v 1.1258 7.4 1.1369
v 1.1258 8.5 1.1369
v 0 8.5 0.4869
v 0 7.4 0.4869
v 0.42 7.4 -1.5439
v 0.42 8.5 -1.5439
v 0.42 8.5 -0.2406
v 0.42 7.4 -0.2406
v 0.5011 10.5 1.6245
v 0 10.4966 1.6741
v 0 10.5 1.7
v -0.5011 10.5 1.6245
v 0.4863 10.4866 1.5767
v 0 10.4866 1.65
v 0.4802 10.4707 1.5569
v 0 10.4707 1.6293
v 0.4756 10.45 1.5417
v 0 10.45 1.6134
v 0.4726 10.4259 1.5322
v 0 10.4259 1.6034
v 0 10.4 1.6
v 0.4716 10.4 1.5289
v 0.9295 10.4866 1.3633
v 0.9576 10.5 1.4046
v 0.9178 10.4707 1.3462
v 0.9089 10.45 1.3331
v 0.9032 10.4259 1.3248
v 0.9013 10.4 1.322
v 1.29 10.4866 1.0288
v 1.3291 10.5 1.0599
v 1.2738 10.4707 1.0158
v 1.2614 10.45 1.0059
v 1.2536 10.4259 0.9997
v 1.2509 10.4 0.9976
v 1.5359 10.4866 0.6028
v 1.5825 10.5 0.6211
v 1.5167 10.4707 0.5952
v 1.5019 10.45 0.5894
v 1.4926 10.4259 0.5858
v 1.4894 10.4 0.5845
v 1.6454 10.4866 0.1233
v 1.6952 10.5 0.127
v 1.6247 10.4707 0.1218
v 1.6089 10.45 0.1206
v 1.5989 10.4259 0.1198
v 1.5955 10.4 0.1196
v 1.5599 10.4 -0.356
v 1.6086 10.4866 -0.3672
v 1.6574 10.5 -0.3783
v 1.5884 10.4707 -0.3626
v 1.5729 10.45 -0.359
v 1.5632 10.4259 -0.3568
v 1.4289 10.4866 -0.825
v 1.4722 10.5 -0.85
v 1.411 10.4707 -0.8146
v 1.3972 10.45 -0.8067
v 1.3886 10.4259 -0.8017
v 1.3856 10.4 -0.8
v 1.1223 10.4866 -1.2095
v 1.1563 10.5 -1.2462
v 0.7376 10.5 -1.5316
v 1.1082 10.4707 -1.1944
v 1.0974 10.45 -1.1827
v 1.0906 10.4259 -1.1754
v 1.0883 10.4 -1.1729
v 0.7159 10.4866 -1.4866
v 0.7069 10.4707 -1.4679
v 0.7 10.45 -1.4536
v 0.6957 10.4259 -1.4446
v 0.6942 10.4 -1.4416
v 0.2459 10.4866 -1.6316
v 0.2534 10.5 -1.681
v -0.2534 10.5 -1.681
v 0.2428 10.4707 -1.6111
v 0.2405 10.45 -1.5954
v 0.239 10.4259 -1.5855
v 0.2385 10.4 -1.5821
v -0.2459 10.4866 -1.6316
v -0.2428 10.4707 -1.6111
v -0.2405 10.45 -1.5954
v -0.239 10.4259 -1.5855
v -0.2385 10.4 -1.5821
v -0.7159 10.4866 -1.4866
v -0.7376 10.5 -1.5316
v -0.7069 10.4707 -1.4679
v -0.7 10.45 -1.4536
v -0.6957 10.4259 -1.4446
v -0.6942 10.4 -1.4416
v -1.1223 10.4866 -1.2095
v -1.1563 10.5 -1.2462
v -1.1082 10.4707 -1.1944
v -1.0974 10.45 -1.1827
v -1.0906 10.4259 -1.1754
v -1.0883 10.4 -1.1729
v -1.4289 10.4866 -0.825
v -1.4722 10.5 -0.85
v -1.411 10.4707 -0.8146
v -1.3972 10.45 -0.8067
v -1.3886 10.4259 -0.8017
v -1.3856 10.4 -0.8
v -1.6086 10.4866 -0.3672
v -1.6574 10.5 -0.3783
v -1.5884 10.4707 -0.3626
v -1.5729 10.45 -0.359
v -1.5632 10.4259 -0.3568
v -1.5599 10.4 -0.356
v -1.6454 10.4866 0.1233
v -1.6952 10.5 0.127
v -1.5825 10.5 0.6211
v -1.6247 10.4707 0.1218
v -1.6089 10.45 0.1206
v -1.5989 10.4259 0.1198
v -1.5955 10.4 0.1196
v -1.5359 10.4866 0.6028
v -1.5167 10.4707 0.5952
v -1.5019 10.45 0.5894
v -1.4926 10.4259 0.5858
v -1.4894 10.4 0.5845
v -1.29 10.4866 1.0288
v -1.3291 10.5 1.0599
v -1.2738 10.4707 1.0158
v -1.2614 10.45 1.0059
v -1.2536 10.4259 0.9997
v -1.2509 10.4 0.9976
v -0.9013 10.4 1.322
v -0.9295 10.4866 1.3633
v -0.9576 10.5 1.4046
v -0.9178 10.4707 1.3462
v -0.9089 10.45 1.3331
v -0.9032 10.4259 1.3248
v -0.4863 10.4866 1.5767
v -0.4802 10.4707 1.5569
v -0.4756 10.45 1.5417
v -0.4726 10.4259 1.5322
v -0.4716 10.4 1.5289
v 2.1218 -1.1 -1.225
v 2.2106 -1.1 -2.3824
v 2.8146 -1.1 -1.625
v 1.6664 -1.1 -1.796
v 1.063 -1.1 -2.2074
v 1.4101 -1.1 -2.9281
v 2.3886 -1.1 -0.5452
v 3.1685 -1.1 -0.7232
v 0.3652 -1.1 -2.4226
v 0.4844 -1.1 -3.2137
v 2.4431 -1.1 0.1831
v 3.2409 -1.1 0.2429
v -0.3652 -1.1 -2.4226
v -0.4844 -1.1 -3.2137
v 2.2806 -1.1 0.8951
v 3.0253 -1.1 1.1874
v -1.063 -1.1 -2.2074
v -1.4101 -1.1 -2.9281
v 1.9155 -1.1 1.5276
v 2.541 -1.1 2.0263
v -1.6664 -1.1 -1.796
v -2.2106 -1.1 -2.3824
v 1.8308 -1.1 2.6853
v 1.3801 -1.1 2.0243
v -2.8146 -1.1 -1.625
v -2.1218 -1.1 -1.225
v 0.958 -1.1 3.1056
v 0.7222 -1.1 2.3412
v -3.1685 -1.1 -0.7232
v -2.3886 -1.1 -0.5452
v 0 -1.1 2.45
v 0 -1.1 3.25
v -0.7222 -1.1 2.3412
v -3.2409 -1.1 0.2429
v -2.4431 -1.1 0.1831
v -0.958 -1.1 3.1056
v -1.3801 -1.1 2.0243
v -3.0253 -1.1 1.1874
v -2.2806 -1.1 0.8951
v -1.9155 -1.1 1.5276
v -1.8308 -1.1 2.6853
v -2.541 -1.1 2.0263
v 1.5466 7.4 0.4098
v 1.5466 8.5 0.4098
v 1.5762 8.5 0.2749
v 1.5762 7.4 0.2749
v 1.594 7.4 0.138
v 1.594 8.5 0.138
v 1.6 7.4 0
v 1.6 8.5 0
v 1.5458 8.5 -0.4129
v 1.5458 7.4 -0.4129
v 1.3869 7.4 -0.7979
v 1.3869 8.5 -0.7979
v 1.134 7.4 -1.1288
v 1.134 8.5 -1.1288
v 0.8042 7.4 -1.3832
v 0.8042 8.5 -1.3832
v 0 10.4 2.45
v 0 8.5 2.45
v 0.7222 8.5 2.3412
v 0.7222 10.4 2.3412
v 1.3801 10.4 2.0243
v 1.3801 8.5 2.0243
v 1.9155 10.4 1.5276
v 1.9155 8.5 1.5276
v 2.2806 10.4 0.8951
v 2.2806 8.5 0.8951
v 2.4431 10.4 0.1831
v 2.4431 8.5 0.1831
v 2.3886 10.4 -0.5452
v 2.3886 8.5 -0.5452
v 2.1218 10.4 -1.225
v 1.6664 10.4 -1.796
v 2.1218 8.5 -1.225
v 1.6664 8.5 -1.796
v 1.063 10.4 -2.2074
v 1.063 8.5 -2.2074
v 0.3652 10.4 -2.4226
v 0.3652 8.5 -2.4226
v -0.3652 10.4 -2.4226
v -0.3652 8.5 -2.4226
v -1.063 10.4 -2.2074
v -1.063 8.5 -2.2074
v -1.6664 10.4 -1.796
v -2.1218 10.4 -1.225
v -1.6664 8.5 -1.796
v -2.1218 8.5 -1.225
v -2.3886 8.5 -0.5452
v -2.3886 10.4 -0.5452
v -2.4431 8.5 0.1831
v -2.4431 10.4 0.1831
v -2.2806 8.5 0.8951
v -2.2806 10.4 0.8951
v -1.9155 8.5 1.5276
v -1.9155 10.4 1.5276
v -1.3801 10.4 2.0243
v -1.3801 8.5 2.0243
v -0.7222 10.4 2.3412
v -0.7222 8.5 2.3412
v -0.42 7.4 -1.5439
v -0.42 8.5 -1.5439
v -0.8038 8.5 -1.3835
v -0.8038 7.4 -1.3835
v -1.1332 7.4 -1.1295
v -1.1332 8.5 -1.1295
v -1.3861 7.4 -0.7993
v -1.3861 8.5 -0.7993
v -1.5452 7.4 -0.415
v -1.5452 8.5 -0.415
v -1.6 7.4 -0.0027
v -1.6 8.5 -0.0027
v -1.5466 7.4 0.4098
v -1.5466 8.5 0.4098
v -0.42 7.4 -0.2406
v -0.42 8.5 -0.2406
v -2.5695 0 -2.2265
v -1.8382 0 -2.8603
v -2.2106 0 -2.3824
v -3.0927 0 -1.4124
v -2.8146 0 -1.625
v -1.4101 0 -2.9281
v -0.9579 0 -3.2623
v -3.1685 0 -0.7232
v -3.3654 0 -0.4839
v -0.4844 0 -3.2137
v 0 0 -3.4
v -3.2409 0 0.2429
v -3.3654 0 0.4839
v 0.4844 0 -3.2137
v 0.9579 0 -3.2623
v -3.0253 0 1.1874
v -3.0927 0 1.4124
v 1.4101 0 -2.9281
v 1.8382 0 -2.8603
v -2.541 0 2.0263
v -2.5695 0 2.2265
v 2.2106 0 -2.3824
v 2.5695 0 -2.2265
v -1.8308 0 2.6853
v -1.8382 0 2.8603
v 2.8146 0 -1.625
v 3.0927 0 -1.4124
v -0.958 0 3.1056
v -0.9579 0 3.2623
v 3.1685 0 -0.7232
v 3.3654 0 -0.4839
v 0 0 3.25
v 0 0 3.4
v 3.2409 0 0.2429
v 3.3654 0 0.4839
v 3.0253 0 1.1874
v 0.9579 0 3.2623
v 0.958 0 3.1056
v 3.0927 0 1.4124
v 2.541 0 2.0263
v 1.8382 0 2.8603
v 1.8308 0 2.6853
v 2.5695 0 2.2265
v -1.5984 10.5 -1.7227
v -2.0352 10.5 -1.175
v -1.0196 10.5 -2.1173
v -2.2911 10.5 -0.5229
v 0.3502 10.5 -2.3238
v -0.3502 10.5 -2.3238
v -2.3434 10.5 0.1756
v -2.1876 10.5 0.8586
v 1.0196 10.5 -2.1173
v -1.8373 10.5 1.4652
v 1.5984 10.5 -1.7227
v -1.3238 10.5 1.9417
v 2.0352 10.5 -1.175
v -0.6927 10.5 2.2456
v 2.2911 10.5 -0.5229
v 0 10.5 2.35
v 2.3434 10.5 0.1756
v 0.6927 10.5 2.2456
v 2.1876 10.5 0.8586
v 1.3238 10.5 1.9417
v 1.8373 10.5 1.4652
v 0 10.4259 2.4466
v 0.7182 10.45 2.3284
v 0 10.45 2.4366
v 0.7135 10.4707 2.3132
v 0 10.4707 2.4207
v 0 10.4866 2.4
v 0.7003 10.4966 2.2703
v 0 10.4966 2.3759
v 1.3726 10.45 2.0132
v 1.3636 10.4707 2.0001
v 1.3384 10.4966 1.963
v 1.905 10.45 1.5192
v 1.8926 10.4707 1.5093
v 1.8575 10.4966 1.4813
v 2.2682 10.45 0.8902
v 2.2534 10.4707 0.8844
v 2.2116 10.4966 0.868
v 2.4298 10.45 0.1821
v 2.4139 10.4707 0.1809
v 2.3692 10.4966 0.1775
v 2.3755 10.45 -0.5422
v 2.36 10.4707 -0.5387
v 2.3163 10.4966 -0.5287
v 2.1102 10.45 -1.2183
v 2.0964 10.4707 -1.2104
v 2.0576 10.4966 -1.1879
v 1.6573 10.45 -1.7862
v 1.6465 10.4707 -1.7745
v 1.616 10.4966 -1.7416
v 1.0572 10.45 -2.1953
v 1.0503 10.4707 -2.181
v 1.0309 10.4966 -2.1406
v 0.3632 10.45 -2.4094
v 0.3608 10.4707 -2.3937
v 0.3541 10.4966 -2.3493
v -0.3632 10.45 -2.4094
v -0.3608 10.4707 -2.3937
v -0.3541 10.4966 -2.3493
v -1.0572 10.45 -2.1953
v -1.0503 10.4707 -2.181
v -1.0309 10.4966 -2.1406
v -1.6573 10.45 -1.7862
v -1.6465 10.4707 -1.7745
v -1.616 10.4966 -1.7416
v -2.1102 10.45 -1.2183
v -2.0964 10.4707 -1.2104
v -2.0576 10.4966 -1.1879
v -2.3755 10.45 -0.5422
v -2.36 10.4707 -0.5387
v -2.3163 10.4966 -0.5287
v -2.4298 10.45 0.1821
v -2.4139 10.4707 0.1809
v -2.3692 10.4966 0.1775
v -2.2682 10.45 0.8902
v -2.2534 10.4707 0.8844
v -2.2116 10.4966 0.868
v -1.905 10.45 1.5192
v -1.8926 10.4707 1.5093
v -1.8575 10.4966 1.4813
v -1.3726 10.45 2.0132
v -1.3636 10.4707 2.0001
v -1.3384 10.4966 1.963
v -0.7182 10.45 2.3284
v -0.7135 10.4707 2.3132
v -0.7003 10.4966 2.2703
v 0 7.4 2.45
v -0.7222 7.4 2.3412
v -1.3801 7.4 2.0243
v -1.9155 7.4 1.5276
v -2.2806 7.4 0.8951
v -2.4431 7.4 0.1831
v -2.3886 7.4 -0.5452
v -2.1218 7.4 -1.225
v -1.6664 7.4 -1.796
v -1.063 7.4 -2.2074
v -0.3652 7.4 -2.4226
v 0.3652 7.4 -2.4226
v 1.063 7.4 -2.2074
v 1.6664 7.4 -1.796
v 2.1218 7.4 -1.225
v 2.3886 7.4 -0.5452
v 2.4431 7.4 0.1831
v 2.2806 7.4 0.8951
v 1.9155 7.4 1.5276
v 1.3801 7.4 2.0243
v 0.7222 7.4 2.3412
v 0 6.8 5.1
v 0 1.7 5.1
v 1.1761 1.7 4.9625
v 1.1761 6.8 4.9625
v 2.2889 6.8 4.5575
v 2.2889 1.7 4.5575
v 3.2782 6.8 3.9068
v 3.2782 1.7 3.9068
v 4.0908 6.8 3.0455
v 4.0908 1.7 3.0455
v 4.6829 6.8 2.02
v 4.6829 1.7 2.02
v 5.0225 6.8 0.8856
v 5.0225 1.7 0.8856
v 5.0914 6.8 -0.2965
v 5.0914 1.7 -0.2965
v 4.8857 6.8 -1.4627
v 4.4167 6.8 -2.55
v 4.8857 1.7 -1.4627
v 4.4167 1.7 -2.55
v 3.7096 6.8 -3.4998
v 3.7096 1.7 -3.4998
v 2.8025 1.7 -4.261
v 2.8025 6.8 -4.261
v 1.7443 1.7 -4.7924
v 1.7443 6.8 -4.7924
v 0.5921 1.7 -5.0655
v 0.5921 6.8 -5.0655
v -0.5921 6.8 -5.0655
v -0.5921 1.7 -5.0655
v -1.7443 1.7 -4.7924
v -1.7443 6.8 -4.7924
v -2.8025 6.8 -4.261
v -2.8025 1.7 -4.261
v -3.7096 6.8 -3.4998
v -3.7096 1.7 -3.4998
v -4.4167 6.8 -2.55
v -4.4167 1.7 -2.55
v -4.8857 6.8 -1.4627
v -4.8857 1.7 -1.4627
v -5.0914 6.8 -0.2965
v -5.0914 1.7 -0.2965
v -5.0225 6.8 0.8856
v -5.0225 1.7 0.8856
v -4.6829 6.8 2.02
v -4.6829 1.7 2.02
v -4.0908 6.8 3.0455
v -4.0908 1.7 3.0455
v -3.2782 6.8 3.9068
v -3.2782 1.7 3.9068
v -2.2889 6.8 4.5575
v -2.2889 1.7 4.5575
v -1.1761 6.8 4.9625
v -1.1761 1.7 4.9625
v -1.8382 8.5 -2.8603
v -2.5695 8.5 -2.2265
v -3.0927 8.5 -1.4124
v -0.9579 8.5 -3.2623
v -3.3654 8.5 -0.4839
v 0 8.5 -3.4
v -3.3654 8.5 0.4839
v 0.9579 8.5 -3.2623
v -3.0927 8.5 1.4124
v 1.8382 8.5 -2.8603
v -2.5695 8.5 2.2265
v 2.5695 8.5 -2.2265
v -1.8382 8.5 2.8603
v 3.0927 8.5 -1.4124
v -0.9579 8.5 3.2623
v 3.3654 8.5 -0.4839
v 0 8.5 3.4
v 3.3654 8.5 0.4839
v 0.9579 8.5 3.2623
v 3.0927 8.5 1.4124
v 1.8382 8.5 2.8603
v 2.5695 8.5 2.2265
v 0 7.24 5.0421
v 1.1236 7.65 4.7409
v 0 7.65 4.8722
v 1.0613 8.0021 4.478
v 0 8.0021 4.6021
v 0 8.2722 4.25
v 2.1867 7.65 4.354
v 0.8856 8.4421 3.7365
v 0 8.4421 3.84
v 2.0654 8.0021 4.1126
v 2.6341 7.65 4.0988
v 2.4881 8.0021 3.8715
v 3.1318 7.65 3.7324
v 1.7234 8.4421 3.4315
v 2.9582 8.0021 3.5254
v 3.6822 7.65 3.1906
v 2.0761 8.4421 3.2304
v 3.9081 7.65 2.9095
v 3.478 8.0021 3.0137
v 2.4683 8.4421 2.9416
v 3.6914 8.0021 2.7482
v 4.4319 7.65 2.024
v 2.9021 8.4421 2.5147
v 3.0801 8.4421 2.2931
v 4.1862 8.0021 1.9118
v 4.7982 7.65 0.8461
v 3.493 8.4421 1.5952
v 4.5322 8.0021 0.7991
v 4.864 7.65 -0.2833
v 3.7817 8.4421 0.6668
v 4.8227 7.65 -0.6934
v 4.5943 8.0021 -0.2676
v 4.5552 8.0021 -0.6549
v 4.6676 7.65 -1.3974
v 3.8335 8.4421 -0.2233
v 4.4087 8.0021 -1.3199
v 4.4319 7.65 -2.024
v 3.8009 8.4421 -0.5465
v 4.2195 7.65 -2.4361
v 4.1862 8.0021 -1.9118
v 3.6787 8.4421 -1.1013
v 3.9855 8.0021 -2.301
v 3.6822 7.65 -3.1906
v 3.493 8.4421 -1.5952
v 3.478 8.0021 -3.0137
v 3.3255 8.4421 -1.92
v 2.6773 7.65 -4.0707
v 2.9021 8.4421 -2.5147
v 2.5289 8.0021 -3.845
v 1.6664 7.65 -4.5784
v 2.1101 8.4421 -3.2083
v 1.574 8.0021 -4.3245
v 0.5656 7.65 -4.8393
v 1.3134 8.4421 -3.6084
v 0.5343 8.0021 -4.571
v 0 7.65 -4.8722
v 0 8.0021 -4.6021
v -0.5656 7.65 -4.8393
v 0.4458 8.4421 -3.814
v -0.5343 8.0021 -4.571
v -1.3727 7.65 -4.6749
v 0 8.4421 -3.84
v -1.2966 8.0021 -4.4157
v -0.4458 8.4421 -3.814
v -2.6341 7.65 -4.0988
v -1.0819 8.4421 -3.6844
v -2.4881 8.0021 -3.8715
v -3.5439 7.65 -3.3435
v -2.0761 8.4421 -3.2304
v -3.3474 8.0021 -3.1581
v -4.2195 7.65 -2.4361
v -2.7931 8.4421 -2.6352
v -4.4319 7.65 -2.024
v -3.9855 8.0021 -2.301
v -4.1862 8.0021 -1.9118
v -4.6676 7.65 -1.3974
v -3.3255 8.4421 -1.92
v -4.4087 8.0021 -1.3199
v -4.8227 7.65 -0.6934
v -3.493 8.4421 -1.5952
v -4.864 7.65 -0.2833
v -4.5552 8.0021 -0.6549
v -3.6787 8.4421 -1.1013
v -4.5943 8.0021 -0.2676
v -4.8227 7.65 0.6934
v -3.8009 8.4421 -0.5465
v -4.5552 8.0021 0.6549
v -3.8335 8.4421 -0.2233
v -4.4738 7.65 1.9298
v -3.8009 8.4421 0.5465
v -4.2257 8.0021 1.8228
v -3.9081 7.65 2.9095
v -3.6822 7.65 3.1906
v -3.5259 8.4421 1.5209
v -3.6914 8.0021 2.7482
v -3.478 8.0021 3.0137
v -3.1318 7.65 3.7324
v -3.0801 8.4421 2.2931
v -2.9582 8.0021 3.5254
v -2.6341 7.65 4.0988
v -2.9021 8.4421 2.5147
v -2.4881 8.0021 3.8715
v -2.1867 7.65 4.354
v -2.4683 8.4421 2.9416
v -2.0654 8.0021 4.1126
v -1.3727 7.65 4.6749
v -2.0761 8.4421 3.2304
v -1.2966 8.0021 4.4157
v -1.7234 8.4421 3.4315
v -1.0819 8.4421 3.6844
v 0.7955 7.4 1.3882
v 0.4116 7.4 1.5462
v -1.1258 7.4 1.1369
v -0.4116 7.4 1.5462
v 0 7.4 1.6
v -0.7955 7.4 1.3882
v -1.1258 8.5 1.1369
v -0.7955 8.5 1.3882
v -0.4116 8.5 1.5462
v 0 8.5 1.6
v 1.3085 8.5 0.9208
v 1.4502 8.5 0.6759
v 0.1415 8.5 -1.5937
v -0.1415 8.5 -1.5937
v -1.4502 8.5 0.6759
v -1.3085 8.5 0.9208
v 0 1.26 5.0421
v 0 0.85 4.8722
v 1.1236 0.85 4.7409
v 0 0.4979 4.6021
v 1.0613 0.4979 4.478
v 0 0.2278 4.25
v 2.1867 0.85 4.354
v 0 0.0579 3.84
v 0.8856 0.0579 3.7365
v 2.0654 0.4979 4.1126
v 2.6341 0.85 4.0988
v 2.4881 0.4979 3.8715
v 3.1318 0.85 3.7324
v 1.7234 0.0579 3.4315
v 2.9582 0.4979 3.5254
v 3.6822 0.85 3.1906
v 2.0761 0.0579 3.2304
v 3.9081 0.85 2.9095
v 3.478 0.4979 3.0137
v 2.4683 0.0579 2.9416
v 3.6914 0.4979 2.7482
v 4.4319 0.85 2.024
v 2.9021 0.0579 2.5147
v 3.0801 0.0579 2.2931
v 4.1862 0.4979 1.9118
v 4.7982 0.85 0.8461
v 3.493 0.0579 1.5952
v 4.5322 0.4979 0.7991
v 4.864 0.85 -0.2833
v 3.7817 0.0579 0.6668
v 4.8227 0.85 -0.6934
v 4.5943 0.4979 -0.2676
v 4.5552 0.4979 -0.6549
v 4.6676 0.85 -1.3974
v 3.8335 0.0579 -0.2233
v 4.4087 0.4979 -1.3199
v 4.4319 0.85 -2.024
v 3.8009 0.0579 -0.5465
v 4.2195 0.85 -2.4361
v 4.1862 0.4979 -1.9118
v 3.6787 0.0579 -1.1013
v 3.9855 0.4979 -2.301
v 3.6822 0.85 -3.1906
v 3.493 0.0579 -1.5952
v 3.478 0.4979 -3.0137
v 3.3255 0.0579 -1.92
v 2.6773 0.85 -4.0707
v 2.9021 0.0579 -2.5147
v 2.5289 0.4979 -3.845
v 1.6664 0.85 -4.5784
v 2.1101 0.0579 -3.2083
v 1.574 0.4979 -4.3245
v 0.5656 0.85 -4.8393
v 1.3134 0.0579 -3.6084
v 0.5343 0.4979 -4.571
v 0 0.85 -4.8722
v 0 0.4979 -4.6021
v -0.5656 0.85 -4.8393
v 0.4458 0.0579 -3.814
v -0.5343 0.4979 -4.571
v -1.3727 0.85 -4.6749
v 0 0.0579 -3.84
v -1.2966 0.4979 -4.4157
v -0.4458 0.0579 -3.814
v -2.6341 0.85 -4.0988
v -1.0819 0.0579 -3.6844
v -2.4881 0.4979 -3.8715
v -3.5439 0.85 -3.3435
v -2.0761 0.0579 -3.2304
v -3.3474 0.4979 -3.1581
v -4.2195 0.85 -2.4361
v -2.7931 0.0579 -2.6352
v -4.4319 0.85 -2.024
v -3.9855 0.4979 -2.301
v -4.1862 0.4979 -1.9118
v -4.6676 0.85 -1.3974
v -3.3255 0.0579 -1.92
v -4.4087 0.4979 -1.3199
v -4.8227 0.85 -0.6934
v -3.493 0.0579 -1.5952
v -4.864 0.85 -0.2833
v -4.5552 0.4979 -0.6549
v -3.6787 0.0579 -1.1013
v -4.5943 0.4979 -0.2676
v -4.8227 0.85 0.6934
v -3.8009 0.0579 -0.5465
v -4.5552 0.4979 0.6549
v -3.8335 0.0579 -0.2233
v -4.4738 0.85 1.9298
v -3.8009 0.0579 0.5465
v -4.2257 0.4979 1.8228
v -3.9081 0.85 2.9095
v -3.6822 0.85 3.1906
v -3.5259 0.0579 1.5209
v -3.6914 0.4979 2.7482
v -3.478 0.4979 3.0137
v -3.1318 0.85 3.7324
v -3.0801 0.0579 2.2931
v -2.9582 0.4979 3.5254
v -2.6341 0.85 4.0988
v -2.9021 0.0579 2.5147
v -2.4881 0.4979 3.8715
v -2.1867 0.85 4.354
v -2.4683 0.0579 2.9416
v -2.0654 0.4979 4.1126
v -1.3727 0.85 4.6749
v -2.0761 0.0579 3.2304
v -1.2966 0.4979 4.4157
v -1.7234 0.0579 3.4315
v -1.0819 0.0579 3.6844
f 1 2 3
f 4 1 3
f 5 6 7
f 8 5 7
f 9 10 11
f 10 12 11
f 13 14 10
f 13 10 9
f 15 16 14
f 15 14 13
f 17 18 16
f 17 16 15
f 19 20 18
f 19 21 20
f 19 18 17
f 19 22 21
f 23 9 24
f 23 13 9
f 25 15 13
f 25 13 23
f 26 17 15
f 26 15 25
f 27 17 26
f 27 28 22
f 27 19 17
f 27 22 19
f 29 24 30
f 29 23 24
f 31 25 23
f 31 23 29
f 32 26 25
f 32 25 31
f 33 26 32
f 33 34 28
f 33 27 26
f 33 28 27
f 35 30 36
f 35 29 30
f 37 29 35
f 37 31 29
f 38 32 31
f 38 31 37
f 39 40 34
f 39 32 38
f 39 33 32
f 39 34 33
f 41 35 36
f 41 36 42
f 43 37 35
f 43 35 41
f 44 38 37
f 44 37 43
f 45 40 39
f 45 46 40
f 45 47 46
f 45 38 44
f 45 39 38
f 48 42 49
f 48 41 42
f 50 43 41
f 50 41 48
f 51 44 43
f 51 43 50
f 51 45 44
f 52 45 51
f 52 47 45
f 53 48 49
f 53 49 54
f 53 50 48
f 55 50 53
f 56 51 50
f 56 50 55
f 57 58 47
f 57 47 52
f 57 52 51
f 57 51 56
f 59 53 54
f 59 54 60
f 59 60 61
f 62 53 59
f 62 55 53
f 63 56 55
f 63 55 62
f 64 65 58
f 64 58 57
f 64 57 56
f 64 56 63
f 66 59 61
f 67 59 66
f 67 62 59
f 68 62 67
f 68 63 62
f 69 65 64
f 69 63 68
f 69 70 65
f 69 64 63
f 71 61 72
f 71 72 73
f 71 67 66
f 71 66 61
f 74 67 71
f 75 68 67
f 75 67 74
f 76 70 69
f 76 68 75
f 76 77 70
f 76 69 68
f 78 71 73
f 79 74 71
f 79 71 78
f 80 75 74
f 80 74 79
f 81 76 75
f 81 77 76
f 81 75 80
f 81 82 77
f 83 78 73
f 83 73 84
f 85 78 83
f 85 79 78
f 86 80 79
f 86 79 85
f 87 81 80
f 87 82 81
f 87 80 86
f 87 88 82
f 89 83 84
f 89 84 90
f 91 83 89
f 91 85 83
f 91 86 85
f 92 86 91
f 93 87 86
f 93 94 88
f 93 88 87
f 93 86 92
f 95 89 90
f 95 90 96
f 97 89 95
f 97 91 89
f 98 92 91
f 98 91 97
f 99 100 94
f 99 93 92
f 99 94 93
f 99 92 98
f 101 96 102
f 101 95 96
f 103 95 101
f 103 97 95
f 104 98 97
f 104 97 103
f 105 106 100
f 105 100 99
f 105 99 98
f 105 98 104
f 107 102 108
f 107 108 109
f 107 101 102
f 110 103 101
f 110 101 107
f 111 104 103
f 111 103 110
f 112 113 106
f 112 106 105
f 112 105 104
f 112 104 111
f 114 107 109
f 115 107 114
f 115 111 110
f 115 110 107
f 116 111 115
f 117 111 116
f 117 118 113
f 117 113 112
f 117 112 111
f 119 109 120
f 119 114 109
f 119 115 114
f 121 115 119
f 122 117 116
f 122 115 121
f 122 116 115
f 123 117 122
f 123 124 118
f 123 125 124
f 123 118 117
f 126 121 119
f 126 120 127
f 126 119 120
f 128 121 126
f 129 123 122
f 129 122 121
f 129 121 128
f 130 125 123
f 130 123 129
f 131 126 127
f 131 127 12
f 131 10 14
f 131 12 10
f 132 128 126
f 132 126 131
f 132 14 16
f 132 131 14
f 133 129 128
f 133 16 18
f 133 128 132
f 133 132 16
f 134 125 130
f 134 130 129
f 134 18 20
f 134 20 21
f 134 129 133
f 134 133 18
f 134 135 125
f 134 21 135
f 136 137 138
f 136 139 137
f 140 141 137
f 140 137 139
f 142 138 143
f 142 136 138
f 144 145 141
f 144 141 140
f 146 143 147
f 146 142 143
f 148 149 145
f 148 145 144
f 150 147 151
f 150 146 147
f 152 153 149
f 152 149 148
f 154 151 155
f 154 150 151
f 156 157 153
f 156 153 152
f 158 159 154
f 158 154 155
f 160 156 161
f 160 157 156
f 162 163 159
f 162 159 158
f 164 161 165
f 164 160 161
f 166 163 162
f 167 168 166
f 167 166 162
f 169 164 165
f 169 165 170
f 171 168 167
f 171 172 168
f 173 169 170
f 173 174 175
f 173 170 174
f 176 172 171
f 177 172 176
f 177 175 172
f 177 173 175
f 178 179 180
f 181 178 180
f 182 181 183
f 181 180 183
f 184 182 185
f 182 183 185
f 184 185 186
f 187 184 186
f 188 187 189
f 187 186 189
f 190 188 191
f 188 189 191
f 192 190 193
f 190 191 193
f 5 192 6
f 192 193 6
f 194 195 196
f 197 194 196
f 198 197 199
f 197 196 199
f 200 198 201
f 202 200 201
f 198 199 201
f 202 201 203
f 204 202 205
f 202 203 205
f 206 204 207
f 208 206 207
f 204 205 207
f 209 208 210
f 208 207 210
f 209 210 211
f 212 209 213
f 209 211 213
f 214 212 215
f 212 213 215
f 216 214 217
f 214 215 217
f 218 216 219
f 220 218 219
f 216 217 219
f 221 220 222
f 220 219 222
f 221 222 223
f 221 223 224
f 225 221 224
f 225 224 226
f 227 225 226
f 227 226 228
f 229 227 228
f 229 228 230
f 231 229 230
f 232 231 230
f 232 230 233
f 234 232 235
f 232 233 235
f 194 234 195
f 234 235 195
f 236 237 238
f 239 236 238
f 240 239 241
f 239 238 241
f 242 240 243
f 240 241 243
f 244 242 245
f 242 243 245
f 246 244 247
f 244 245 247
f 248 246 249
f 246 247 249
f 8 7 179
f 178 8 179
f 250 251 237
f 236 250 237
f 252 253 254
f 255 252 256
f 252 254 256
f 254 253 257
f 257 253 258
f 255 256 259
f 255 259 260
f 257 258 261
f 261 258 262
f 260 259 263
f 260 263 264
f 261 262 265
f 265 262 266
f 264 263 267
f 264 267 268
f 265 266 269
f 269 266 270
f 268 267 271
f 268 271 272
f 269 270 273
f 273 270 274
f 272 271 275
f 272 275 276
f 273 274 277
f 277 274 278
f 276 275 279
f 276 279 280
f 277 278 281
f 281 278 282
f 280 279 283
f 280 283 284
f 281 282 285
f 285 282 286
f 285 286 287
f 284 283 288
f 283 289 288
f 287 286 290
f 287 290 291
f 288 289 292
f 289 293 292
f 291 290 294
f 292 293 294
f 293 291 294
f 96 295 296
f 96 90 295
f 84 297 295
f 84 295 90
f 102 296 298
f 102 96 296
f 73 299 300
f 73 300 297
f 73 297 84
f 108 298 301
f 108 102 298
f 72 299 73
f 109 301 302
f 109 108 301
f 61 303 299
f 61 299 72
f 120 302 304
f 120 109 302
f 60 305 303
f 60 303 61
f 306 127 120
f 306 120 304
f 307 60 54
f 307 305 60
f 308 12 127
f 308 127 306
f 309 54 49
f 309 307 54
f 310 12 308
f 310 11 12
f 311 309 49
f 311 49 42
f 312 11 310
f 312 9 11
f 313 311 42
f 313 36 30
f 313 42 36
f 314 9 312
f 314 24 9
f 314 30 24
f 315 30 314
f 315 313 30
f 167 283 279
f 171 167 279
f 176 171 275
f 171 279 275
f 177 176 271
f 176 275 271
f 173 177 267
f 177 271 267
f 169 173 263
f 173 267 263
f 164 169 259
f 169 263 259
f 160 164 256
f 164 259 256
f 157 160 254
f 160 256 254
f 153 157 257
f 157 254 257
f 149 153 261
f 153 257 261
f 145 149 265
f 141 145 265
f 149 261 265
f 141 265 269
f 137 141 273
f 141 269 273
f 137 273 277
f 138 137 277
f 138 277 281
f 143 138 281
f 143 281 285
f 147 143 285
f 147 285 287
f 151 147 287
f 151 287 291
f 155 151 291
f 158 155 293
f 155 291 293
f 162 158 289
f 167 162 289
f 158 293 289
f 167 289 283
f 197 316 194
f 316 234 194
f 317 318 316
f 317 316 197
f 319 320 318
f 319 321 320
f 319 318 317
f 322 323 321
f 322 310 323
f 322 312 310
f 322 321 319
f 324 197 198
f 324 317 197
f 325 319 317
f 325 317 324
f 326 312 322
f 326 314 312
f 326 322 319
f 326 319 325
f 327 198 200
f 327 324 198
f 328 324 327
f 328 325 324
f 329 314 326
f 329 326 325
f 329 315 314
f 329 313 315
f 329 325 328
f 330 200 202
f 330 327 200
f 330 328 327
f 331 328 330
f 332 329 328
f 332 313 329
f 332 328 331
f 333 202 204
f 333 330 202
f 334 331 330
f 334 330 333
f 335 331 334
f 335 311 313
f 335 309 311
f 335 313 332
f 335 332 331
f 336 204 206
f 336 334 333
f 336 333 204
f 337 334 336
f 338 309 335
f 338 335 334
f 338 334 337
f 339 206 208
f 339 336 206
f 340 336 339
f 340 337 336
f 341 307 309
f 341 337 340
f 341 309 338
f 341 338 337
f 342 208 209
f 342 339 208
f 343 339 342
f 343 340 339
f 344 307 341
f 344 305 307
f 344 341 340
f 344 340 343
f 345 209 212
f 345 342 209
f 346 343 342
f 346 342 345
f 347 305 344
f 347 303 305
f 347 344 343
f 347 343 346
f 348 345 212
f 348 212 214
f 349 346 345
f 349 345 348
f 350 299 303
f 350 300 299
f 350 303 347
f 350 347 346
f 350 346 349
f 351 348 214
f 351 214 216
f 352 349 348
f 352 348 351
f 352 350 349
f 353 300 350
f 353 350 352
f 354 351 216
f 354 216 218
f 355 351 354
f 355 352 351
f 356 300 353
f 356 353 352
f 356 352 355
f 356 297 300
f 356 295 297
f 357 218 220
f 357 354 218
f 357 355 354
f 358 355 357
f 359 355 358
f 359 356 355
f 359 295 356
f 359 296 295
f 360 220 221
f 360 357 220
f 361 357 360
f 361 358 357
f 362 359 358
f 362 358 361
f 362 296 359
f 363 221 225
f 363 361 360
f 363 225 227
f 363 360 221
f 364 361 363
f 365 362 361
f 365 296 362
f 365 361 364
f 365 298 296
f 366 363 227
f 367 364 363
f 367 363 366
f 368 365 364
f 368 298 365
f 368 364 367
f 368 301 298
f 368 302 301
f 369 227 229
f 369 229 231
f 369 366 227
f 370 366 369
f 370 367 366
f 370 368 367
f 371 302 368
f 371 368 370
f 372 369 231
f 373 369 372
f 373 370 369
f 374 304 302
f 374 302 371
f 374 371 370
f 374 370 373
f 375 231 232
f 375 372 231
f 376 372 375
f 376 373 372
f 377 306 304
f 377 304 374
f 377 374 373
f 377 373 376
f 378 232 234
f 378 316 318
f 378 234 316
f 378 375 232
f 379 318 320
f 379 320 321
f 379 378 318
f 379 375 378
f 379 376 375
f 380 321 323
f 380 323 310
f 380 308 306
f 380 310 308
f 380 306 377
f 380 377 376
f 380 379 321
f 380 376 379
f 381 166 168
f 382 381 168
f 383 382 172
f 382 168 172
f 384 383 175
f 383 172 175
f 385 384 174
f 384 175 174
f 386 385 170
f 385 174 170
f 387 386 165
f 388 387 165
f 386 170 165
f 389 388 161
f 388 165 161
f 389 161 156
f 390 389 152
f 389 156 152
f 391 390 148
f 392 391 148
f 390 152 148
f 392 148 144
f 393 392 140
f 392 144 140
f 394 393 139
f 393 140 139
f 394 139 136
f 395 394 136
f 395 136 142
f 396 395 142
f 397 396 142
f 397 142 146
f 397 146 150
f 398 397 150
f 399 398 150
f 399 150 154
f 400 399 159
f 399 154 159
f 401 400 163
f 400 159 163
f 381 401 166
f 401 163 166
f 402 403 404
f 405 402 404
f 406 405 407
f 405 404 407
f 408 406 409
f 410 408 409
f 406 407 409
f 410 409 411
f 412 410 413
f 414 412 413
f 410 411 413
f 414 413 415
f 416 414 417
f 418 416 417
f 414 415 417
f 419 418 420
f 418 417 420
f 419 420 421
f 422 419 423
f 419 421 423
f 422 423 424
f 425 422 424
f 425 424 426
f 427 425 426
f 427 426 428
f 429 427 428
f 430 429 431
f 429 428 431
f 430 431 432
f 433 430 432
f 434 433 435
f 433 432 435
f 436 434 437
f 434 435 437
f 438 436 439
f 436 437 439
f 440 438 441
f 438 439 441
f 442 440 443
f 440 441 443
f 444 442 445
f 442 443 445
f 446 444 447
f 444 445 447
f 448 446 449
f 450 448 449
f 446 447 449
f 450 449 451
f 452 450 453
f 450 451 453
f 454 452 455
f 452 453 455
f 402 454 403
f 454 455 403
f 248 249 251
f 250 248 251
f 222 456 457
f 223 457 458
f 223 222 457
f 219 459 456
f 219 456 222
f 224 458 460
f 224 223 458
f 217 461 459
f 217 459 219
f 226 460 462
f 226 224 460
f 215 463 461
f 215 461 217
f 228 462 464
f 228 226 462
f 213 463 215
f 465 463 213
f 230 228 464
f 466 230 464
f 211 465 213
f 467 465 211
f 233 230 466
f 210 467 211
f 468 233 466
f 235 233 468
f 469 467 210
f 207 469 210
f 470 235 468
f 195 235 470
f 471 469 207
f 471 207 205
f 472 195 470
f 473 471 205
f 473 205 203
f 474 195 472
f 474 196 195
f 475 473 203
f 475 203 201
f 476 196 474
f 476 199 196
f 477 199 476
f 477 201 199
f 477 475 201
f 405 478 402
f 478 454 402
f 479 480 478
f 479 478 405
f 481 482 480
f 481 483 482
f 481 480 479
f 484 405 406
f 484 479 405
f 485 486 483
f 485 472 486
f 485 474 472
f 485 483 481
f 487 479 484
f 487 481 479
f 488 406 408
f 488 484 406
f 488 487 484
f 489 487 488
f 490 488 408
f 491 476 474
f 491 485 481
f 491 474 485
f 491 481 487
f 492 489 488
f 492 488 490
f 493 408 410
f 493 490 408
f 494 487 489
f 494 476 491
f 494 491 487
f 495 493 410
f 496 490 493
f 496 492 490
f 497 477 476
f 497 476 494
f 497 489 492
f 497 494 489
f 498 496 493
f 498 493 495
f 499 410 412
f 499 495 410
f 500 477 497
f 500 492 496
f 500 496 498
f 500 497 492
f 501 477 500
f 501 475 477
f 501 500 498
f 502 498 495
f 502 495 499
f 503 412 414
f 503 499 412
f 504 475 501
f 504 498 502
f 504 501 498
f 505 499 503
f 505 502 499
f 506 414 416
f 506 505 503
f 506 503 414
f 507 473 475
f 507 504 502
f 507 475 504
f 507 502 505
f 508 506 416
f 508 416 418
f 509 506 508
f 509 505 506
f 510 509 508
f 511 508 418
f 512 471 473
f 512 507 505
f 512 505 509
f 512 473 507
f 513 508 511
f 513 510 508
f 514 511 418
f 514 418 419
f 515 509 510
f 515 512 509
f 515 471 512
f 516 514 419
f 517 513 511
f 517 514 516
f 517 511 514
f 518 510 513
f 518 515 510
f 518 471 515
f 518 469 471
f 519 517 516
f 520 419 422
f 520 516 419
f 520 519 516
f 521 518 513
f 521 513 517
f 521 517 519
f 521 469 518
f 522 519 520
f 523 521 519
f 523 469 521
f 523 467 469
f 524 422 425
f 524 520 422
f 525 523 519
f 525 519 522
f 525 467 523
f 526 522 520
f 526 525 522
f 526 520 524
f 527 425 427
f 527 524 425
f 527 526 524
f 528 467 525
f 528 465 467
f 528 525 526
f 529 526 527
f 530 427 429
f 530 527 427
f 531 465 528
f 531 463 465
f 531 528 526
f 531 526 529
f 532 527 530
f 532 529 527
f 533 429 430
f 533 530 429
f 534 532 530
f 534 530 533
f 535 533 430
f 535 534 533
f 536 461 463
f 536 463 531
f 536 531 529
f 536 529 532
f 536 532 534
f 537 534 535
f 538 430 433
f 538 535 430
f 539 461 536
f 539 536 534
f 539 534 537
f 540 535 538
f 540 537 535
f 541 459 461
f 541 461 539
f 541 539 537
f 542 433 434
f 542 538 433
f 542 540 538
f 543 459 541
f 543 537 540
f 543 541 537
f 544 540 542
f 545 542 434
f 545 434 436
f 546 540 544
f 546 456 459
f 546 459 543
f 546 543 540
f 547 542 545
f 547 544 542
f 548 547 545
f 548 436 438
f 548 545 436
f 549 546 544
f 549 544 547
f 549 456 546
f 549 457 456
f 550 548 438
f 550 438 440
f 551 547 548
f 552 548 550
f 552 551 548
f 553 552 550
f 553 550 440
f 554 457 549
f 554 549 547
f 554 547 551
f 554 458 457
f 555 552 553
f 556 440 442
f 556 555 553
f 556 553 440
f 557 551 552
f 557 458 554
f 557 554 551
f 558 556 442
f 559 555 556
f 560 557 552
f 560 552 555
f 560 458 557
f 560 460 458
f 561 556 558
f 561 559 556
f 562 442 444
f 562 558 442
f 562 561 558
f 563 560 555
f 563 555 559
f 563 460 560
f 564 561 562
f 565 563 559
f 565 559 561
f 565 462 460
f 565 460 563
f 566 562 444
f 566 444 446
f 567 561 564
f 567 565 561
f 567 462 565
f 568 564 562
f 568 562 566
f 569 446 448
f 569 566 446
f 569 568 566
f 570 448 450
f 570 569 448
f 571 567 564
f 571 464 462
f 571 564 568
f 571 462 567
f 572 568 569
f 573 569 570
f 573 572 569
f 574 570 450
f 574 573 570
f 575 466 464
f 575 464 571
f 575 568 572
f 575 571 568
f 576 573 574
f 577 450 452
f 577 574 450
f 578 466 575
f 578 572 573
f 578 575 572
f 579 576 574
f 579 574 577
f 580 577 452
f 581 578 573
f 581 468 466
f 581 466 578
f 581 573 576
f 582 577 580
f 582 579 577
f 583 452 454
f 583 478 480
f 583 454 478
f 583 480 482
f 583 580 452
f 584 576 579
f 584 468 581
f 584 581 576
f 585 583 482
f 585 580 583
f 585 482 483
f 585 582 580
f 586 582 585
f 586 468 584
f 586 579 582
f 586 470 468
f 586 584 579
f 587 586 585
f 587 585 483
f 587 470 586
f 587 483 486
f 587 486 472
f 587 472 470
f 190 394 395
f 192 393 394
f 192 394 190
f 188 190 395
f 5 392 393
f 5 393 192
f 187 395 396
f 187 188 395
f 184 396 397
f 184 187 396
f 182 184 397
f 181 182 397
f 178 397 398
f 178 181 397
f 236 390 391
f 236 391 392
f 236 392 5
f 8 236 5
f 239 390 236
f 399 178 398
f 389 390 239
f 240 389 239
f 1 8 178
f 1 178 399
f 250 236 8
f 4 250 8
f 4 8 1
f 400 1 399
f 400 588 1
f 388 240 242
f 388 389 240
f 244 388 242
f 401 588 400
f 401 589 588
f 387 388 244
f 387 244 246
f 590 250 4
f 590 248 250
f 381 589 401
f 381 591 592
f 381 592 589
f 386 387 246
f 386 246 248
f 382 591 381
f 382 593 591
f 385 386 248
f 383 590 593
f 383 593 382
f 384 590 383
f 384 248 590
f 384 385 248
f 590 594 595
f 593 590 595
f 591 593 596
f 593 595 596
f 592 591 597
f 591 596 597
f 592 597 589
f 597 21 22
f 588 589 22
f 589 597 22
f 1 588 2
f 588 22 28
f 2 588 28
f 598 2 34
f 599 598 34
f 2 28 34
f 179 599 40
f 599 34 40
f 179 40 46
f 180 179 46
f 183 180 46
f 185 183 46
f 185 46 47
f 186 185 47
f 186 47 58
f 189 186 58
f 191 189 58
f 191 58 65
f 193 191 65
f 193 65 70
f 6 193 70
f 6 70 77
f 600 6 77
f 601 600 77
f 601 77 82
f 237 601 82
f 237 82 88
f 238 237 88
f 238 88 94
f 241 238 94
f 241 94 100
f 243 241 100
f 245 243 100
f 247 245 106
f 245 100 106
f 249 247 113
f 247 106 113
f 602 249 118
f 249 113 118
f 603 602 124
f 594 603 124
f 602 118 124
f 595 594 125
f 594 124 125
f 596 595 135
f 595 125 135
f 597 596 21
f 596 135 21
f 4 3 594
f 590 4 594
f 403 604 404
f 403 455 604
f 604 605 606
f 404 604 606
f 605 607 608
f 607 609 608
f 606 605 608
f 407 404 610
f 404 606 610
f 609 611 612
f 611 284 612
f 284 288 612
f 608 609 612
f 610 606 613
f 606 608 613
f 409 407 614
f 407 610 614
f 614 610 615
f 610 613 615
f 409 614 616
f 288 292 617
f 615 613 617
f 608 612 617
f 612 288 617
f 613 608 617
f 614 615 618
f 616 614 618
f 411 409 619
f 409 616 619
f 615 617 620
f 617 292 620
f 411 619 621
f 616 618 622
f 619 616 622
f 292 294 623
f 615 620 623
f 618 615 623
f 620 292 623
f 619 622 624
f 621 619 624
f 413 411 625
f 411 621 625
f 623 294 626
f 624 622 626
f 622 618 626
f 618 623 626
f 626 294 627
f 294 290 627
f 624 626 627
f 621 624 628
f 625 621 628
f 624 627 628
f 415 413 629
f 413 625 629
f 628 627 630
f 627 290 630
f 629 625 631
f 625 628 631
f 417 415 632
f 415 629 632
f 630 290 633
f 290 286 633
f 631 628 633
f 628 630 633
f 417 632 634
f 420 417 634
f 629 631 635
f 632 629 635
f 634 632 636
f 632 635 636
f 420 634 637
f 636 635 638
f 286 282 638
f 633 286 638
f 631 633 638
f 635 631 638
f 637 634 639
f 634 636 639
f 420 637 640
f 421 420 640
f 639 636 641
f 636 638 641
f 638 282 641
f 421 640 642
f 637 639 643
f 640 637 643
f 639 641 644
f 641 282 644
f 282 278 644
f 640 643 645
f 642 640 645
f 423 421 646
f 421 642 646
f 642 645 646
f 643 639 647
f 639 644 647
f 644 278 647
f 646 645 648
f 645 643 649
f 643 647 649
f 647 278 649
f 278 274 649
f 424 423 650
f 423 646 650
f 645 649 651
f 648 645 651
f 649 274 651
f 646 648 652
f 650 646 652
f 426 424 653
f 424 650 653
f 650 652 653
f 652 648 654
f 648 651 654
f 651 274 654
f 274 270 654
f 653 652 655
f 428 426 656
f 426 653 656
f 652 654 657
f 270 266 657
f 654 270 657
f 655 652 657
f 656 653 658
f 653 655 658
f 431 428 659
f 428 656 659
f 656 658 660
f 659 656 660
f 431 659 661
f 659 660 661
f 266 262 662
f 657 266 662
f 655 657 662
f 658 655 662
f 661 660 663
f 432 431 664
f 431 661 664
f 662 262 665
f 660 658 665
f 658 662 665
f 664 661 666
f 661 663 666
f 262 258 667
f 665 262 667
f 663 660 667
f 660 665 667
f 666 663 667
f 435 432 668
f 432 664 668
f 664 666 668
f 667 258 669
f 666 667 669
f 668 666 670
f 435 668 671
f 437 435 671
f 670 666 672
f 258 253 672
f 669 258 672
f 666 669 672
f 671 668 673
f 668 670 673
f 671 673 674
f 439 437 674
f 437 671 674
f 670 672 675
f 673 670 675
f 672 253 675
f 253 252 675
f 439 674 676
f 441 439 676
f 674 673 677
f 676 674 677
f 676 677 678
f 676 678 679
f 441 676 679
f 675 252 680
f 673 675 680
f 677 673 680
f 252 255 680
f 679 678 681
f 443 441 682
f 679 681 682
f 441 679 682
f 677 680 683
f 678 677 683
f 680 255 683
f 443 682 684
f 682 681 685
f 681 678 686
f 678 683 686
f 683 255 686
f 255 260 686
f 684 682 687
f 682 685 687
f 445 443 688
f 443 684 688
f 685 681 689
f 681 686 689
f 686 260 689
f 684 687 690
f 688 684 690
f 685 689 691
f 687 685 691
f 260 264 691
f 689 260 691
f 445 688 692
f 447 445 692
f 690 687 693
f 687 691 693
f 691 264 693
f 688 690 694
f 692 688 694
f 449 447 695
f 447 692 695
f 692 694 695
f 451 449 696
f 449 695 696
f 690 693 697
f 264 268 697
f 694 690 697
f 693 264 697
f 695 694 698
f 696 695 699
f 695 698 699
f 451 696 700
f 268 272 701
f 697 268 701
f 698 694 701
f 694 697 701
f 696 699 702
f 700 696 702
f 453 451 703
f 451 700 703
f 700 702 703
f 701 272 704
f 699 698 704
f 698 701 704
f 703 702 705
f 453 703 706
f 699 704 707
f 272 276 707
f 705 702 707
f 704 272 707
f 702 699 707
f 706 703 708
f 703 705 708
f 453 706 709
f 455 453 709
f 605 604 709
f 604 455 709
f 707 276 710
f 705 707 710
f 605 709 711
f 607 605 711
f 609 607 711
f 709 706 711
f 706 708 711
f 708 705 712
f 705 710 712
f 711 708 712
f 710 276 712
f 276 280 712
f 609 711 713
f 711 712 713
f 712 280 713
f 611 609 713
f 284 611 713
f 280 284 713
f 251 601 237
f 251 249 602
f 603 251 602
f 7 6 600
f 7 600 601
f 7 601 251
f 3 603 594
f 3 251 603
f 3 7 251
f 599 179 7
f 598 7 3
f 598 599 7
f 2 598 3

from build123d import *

# Parameters (mm, degrees)
SKETCH2_R           = 5.1
BOSS_EXTRUDE1_DEPTH = 8.5
SKETCH3_R           = 2.45
BOSS_EXTRUDE2_DEPTH = 2
SKETCH4_R           = 1.6
CUT_EXTRUDE1_DEPTH  = 2
FILLET1_R           = 1.7
FILLET2_R           = 0.1
SKETCH5_R           = 3.25
BOSS_EXTRUDE3_DEPTH = 1.1
SKETCH6_R           = 2.45
CUT_EXTRUDE2_DEPTH  = 8.5
CUT_EXTRUDE3_DEPTH  = 1.1


with BuildPart() as part:
    # Sketch2 → Boss-Extrude1 (new body)
    with BuildSketch(Plane(origin=(0, 0, 0), x_dir=(1, 0, 0), z_dir=(0, 1, 0))):
        with Locations(Location((0, 0, 0), (0, 0, 270))):
            Circle(SKETCH2_R)
    extrude(amount=BOSS_EXTRUDE1_DEPTH)

    # Sketch3 → Boss-Extrude2 (add)
    with BuildSketch(Plane(origin=(0, 8.5, 0), x_dir=(1, 0, 0), z_dir=(0, 1, 0))):
        with Locations(Location((0, 0, 0), (0, 0, 270))):
            Circle(SKETCH3_R)
    extrude(amount=BOSS_EXTRUDE2_DEPTH)

    # Sketch4 → Cut-Extrude1 (cut)
    with BuildSketch(Plane(origin=(0, 10.5, 0), x_dir=(1, 0, 0), z_dir=(0, 1, 0))):
        with Locations(Location((0, 0, 0), (0, 0, 270))):
            Circle(SKETCH4_R)
    extrude(amount=-CUT_EXTRUDE1_DEPTH, mode=Mode.SUBTRACT)

    # Fillet1
    fillet1_edges = [part.edges().sort_by_distance(p)[0] for p in [
        (0, 0, -5.1),
        (0, 8.5, -5.1),
    ]]
    fillet(fillet1_edges, radius=FILLET1_R)

    # Fillet2
    fillet2_edges = [part.edges().sort_by_distance(p)[0] for p in [
        (0, 10.5, -1.6),
        (0, 10.5, -2.45),
    ]]
    fillet(fillet2_edges, radius=FILLET2_R)

    # Sketch5 → Boss-Extrude3 (add)
    with BuildSketch(Plane.XZ):
        with Locations(Location((0, 0, 0), (0, 0, 90))):
            Circle(SKETCH5_R)
    extrude(amount=BOSS_EXTRUDE3_DEPTH)

    # Sketch6 → Cut-Extrude2 (cut)
    with BuildSketch(Plane.XZ.offset(1.1)):
        with Locations(Location((0, 0, 0), (0, 0, 90))):
            Circle(SKETCH6_R)
    extrude(amount=-CUT_EXTRUDE2_DEPTH, mode=Mode.SUBTRACT)

    # Sketch11 → Cut-Extrude3 (cut)
    with BuildSketch(Plane(origin=(0, 8.5, 0), x_dir=(1, 0, 0), z_dir=(0, 1, 0))):
        with BuildLine():
            Line((-0.42, 0.240604968), (-0.42, 1.543891188))
            ThreePointArc((-0.42, 1.543891188), (-1.386062698, 0.799268539), (-1.546617211, -0.409847781))
            Line((-1.546617211, -0.409847781), (-0.42, 0.240604968))
        make_face()
        with BuildLine():
            ThreePointArc((1.6, 0), (1.271219887, 0.971596624), (0.42, 1.543891188))
            Line((0.42, 1.543891188), (0.42, 0.240604968))
            Line((0.42, 0.240604968), (1.546617211, -0.409847781))
            ThreePointArc((1.546617211, -0.409847781), (1.586598175, -0.206654861), (1.6, 0))
        make_face()
        with BuildLine():
            Line((0, -0.486856371), (-1.125849182, -1.136865699))
            ThreePointArc((-1.125849182, -1.136865699), (0, -1.6), (1.125849182, -1.136865699))
            Line((1.125849182, -1.136865699), (0, -0.486856371))
        make_face()
    extrude(amount=-CUT_EXTRUDE3_DEPTH, mode=Mode.SUBTRACT)


solid = part.part
